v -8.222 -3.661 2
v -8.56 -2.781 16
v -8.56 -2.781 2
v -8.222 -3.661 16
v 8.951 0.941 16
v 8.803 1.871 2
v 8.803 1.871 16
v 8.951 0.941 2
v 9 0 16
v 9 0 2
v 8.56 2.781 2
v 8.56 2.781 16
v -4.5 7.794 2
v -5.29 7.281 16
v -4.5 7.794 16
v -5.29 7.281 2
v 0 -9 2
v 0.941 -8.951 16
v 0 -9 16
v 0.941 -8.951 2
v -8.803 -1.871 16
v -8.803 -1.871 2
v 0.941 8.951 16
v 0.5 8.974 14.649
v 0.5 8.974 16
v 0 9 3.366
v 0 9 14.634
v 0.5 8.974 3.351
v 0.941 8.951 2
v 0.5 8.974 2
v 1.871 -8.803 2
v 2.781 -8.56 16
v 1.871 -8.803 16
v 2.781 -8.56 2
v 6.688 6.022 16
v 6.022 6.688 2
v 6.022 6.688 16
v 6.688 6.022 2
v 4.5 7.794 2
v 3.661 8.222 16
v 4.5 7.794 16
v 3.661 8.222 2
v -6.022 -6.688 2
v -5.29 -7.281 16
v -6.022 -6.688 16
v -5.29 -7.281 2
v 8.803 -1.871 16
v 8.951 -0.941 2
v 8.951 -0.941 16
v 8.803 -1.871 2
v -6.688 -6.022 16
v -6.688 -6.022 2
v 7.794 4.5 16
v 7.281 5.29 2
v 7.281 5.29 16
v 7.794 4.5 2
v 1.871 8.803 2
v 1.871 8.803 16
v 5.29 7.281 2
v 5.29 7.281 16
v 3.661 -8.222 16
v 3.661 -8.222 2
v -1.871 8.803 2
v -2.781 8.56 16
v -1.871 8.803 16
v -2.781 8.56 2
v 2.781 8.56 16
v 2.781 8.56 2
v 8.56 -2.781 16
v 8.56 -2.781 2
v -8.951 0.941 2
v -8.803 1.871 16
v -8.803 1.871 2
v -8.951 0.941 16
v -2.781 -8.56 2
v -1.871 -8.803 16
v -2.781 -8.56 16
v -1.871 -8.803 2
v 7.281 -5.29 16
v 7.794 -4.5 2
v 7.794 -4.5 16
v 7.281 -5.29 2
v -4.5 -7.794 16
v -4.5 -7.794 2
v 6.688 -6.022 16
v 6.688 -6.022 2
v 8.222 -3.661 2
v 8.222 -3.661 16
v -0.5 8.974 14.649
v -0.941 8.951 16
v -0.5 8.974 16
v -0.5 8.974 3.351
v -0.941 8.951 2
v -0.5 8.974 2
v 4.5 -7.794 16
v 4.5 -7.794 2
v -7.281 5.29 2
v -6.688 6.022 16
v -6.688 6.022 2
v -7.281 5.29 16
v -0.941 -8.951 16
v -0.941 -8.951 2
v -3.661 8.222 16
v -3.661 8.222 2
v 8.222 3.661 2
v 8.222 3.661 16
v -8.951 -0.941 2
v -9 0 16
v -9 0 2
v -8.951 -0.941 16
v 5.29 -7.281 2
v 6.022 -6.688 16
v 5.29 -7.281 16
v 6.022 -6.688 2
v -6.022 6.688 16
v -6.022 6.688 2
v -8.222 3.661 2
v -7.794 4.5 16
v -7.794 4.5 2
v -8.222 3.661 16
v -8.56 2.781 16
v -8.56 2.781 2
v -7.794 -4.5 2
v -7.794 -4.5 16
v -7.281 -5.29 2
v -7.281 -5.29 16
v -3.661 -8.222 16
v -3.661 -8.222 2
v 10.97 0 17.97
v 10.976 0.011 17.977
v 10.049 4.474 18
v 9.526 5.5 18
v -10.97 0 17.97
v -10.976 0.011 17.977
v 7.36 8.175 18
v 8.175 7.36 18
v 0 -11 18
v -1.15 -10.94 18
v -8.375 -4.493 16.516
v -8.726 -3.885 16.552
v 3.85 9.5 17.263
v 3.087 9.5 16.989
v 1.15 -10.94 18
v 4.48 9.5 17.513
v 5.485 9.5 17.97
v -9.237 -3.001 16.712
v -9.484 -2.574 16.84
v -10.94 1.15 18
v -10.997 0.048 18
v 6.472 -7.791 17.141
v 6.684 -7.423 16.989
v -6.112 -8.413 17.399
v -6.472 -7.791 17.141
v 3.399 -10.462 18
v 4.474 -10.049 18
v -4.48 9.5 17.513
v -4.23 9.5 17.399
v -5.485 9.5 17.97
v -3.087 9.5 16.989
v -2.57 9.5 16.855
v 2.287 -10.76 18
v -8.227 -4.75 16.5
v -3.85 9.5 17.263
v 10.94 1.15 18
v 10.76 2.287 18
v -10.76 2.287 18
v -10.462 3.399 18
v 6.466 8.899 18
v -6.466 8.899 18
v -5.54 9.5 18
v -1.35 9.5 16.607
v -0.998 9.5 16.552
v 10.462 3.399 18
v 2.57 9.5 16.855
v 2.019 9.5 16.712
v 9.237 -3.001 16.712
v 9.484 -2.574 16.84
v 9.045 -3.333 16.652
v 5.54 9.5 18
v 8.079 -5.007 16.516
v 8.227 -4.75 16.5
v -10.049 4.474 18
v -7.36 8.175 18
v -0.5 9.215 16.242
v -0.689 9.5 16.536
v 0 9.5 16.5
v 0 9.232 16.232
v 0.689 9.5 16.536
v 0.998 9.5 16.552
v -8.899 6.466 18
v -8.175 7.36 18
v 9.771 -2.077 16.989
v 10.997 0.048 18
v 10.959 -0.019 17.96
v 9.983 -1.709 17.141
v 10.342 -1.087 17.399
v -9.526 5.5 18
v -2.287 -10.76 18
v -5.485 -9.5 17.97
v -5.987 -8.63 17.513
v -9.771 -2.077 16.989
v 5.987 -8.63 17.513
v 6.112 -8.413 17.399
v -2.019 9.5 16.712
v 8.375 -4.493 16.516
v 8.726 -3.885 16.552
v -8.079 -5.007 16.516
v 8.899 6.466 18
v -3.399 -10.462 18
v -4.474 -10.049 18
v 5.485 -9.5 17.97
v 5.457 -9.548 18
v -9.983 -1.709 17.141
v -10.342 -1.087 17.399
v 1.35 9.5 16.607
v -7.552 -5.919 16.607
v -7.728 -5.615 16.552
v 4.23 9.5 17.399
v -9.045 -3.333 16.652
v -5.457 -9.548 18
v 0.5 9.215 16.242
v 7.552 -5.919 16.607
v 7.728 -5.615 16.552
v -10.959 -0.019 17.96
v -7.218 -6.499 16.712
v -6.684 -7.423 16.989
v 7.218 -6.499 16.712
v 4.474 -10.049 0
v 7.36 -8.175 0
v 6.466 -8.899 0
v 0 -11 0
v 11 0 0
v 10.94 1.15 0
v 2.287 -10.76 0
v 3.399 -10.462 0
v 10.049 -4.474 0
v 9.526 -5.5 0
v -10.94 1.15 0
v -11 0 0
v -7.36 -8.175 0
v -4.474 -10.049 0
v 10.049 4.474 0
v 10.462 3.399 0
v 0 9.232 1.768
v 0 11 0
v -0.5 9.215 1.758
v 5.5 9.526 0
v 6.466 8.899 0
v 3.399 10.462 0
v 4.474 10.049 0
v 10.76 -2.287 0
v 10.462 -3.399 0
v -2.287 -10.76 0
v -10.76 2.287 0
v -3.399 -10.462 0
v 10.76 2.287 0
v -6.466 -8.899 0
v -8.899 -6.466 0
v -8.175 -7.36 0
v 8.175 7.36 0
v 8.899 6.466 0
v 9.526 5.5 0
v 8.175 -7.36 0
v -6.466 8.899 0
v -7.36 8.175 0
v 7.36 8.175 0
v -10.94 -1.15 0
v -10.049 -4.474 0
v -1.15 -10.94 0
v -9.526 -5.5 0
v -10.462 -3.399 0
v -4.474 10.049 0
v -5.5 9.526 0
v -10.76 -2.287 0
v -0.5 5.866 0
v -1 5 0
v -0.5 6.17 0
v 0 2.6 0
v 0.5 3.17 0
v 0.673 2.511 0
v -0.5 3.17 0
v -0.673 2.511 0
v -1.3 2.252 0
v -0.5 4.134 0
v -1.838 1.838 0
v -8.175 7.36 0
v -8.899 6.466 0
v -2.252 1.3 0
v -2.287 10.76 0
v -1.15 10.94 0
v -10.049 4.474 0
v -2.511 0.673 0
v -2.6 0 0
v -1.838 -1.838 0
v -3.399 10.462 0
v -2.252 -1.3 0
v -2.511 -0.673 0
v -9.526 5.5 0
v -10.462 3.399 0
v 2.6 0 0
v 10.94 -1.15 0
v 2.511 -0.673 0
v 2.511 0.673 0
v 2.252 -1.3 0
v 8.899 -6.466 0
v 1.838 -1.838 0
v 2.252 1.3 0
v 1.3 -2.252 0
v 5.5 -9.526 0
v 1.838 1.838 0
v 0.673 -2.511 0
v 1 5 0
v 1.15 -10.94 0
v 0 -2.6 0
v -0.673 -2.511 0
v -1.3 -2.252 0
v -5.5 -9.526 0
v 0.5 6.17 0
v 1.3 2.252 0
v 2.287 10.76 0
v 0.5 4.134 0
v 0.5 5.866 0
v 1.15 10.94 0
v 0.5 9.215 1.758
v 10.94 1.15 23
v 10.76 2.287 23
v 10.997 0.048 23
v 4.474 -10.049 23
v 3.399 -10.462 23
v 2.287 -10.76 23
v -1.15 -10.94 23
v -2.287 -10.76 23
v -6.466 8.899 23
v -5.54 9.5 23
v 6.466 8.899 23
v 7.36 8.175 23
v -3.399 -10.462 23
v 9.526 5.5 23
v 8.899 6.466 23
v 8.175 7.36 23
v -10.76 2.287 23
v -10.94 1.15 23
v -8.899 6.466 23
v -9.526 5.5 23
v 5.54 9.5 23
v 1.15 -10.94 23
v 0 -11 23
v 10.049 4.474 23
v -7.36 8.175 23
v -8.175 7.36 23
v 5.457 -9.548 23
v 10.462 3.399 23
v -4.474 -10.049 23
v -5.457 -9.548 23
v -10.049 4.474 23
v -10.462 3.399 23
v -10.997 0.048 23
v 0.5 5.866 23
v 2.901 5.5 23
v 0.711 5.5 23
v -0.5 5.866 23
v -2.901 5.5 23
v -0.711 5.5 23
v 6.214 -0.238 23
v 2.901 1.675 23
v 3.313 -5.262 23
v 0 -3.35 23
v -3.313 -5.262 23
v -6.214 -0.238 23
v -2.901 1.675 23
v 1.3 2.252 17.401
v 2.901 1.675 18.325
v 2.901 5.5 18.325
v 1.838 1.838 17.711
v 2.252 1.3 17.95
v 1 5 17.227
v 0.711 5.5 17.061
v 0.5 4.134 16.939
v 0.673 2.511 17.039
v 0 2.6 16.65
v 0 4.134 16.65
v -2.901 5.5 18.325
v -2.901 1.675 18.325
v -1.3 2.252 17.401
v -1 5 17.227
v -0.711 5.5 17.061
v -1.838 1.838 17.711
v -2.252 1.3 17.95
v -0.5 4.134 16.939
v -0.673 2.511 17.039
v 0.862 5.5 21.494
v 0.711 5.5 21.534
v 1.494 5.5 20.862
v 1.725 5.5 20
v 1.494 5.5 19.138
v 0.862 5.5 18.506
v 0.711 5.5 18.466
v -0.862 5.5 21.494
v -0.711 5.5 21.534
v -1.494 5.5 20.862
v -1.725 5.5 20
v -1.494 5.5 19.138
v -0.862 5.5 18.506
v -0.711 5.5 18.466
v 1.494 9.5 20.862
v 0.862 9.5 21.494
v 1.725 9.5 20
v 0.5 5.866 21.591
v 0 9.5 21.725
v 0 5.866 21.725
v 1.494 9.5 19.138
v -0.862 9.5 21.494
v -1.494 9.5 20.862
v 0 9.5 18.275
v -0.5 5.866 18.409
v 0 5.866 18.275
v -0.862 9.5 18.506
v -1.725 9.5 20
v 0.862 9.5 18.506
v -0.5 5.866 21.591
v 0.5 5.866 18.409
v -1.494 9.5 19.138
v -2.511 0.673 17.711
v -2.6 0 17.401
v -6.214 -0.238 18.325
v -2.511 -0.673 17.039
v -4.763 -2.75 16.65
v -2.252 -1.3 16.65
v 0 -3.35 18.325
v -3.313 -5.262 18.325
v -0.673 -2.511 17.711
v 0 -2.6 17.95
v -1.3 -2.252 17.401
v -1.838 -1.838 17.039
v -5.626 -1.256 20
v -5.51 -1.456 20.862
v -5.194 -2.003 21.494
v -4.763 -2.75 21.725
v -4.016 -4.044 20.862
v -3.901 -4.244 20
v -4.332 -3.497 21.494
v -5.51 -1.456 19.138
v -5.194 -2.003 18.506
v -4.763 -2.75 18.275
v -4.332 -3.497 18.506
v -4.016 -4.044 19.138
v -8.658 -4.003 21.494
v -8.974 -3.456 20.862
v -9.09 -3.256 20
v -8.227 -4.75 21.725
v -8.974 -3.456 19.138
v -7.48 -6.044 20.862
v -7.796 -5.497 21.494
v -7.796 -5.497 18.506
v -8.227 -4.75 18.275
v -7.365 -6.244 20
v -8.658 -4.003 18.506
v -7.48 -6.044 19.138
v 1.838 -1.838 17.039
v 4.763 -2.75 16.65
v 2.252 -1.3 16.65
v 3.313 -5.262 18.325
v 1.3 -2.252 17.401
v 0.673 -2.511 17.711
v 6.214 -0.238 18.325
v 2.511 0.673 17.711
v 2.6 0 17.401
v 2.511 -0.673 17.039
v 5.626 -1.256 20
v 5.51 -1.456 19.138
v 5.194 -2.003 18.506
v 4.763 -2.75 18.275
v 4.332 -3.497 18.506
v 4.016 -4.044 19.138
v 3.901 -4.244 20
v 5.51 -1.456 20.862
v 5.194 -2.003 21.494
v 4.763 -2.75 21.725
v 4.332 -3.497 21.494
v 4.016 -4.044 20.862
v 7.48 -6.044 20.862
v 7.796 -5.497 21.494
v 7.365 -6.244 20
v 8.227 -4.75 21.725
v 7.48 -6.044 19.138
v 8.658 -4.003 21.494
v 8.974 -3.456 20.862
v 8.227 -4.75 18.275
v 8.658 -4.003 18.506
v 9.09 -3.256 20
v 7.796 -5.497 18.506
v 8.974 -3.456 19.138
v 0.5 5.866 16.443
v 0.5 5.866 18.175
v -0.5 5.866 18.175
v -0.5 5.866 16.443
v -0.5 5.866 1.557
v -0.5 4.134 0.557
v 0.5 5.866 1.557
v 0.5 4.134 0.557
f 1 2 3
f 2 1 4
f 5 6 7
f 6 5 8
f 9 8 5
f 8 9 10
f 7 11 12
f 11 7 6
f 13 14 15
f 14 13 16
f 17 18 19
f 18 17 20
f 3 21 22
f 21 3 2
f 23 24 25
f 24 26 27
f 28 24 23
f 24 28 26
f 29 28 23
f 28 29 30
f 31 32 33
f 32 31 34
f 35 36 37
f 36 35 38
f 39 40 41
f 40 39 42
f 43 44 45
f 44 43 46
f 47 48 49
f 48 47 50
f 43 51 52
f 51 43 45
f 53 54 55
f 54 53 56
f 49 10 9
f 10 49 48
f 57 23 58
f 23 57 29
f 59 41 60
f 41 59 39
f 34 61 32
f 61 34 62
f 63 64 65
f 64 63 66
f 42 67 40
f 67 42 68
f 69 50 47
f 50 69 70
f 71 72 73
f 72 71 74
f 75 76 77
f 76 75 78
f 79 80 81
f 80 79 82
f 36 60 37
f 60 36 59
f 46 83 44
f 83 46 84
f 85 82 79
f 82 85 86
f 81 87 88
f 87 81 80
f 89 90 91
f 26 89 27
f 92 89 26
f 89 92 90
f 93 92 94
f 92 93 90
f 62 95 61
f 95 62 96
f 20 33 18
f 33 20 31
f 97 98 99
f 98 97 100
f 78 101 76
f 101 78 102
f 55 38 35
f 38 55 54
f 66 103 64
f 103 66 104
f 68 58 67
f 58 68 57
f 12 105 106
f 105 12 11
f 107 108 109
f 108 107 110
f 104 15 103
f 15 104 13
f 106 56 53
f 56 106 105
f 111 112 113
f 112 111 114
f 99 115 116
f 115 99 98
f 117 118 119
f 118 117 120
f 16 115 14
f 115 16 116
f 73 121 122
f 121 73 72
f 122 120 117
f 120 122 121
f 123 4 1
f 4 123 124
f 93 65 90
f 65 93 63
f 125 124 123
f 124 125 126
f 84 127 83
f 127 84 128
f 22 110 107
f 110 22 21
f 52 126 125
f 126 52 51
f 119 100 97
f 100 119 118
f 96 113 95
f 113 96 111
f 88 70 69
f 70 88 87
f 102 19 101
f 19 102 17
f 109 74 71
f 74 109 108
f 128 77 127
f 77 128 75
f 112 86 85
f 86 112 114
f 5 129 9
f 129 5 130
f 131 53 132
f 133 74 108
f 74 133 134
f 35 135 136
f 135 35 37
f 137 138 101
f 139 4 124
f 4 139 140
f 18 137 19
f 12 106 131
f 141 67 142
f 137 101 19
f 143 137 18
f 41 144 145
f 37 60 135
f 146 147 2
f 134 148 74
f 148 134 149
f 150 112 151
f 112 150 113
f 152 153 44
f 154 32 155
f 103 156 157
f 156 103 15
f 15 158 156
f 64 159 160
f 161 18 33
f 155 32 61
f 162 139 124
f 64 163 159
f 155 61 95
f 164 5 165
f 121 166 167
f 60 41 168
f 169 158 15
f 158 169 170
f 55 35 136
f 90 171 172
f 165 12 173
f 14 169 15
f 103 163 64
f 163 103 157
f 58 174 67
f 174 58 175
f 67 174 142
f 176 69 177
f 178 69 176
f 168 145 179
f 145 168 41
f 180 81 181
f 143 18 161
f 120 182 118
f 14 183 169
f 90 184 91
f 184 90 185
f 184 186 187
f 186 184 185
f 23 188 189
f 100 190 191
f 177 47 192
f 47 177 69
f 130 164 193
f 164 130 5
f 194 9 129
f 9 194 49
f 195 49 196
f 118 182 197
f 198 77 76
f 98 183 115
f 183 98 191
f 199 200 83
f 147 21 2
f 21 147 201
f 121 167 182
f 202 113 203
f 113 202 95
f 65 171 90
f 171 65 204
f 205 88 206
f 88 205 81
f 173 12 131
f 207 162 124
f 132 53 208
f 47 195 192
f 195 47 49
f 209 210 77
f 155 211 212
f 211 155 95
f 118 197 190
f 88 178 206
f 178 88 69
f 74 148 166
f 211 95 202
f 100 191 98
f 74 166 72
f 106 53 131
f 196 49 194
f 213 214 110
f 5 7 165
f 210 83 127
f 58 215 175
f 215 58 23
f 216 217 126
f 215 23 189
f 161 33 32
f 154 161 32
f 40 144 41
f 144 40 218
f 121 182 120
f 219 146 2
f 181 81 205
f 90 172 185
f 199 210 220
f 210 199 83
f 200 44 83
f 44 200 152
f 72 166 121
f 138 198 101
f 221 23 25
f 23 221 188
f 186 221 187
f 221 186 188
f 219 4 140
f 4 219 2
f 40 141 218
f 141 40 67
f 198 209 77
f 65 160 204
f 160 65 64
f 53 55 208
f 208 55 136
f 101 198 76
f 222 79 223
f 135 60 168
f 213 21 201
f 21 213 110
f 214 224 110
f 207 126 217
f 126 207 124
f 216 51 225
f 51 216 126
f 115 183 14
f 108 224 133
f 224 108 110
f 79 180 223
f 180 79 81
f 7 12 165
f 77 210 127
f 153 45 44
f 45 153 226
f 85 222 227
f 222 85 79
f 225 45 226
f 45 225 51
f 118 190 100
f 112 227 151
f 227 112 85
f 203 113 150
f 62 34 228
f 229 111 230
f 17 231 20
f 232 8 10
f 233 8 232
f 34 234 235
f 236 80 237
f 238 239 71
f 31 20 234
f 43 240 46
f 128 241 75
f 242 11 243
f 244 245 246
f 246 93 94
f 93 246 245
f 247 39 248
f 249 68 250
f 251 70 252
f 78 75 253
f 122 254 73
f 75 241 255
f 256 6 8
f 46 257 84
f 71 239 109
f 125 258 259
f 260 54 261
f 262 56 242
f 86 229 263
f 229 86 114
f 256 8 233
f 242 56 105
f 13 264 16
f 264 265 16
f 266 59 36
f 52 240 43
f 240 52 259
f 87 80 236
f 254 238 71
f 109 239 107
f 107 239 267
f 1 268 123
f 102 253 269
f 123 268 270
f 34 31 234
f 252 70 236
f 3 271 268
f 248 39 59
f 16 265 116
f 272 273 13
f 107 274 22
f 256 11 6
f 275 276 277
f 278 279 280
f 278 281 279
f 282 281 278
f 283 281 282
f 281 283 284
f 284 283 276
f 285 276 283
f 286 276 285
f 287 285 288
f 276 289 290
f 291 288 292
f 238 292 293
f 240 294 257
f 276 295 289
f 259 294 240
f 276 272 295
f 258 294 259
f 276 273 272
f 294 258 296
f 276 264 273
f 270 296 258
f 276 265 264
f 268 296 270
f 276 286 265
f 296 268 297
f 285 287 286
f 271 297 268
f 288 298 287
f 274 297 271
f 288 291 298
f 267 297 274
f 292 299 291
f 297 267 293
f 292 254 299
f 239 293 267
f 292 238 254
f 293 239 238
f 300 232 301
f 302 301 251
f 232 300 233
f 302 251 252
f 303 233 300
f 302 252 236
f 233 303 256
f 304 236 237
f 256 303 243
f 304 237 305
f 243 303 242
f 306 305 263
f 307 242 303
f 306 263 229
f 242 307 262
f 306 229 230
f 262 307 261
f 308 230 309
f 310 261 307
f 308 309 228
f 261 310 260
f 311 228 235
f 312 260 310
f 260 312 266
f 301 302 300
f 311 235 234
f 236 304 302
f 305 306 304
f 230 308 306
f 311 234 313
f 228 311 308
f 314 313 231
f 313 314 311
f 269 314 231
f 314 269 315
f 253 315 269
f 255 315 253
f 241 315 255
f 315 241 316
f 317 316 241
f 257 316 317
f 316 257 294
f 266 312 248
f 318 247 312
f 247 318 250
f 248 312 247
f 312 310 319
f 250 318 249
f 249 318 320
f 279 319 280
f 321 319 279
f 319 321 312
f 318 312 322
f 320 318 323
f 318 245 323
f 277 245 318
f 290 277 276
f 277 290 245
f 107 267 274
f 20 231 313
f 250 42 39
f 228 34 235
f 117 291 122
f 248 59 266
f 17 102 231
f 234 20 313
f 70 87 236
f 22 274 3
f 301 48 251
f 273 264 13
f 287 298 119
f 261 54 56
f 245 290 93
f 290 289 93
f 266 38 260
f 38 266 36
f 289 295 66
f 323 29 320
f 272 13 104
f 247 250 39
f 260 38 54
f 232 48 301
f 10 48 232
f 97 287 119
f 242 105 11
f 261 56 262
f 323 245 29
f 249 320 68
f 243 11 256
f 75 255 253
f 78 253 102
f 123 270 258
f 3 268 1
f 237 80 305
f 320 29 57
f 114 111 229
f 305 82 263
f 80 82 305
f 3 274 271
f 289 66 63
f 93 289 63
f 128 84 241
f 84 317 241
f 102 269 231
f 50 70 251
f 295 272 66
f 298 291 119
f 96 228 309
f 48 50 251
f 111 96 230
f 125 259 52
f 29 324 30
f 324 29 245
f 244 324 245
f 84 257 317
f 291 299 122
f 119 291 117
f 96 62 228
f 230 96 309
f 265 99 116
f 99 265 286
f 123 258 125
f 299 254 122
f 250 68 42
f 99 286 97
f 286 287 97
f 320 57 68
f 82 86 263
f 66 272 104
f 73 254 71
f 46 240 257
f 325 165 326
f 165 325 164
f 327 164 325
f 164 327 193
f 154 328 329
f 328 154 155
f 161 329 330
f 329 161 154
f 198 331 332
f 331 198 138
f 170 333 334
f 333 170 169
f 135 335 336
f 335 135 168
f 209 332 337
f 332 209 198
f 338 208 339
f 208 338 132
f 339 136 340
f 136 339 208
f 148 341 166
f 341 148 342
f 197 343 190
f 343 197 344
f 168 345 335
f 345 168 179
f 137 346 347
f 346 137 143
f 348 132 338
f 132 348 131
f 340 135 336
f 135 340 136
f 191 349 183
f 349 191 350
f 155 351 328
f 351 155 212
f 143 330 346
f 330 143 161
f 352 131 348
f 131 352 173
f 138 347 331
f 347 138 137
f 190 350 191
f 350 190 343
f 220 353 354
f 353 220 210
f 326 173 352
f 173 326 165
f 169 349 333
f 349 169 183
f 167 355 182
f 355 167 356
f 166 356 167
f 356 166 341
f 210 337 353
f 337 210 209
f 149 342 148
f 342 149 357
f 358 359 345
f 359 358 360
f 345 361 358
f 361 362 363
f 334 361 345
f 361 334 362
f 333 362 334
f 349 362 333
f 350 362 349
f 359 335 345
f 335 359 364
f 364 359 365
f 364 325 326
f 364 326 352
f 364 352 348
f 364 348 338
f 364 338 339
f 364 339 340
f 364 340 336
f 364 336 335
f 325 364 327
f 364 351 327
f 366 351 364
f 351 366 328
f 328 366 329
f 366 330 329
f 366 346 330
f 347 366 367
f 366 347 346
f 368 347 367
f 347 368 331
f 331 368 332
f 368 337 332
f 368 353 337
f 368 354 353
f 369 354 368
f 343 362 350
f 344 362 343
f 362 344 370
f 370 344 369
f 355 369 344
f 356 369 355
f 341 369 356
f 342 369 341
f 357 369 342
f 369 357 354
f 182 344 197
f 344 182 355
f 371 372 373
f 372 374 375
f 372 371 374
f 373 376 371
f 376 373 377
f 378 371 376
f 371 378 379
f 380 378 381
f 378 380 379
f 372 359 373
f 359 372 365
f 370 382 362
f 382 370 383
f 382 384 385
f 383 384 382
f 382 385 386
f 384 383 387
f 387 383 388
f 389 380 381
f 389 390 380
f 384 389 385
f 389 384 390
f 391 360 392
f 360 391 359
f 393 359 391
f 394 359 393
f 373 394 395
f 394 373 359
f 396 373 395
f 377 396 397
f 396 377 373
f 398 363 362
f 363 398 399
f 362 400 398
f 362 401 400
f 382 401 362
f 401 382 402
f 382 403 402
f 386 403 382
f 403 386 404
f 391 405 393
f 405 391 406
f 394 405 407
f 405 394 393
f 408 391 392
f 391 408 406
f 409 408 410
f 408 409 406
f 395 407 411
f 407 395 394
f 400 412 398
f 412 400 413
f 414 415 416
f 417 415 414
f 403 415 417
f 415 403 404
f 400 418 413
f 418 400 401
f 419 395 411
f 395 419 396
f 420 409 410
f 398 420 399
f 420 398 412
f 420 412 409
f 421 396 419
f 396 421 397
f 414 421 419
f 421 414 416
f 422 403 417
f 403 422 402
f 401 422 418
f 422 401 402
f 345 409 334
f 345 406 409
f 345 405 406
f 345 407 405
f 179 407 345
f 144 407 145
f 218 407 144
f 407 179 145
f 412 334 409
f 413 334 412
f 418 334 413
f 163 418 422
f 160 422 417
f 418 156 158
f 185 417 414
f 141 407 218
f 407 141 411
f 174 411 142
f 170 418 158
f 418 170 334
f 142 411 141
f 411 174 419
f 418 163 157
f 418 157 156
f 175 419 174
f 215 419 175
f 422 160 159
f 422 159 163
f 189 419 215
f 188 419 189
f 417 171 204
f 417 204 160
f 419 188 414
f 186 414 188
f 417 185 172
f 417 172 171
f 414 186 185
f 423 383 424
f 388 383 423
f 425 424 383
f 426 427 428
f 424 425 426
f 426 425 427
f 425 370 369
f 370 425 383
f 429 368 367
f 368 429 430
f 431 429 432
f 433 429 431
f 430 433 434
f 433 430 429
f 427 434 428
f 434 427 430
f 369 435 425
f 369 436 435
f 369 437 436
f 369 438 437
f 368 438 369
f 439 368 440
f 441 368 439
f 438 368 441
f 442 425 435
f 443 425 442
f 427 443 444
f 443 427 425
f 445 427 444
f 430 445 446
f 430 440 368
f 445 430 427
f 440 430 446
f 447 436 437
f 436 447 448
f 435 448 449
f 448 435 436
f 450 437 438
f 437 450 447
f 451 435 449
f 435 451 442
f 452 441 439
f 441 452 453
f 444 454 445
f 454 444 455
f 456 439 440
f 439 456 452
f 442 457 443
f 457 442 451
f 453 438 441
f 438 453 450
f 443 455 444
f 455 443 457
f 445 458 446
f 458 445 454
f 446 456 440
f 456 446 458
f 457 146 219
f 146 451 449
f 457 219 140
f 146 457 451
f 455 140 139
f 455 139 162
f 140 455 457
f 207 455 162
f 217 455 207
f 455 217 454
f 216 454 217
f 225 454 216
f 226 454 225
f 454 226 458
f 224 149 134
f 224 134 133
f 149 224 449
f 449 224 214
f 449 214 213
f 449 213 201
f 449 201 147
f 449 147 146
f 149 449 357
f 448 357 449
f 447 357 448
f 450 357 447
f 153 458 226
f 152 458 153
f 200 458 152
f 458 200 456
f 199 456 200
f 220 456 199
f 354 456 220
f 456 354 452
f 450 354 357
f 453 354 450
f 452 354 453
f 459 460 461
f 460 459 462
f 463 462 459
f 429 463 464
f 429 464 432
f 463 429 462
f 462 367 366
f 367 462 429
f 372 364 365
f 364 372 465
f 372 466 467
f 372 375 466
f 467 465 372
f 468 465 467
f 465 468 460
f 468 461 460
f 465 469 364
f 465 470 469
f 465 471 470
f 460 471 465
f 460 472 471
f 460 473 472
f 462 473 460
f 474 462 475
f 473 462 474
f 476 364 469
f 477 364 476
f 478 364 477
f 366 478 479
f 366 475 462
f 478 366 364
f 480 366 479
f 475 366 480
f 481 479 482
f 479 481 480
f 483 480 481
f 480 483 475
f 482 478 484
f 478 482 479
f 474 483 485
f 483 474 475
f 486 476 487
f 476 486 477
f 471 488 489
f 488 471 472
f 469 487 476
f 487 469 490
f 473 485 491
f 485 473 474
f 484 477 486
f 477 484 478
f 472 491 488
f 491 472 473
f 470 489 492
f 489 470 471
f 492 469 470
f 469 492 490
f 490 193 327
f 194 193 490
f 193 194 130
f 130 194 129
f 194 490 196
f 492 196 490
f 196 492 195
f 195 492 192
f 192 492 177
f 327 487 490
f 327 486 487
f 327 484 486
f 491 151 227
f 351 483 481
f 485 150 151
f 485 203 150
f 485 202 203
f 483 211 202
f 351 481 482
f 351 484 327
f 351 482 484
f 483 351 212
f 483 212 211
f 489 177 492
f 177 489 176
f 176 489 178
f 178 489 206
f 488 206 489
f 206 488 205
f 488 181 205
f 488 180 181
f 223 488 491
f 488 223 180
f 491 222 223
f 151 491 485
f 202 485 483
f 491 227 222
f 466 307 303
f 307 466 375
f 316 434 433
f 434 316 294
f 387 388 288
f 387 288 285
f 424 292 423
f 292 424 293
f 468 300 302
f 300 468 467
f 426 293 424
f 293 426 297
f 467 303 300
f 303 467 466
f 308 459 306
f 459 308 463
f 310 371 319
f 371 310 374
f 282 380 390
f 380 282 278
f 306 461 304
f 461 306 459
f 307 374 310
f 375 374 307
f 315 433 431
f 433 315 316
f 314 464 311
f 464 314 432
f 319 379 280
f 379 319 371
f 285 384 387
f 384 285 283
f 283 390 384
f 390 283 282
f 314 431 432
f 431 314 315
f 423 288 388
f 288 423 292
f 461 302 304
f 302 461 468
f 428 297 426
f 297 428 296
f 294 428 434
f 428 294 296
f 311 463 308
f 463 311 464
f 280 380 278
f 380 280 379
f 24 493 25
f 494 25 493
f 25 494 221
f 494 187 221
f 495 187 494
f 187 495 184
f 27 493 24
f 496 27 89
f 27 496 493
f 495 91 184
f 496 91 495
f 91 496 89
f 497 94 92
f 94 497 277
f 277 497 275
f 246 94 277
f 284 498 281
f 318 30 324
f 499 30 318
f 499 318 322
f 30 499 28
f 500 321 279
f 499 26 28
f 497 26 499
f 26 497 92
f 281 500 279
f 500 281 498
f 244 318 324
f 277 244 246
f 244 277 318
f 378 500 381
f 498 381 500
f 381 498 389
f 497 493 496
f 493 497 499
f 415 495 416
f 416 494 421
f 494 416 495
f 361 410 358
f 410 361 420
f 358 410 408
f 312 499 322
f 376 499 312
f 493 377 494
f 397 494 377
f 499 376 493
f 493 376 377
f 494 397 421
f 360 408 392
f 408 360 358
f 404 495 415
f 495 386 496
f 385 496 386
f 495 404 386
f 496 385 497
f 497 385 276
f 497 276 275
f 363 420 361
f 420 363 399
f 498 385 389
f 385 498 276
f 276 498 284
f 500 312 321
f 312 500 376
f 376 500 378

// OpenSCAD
// file: ../include/configuration.scad
// Increase this if your slicer or printer make holes too tight.
extra_radius = 0.1;

// OD = outside diameter, corner to corner.
m3_nut_od = 6.1;
m3_nut_radius = m3_nut_od/2 + 0.2 + extra_radius;
m3_washer_radius = 3.5 + extra_radius;

// Major diameter of metric 3mm thread.
m3_major = 2.85;
m3_radius = m3_major/2 + extra_radius;
m3_wide_radius = m3_major/2 + extra_radius + 0.2;

// NEMA17 stepper motors.
motor_shaft_diameter = 5;
motor_shaft_radius = motor_shaft_diameter/2 + extra_radius;

// Frame brackets. M3x8mm screws work best with 3.6 mm brackets.
thickness = 3.6;

// OpenBeam or Misumi. Currently only 15x15 mm, but there is a plan
// to make models more parametric and allow 20x20 mm in the future.
extrusion = 15;

// Placement for the NEMA17 stepper motors.
motor_offset = 44;
motor_length = 47;
// main file
include <../include/configuration.scad>;

radius = 9;
width = 16;
top = 5;
smoothness = 60;

module spool() {
  difference() {
    union() {
      cylinder(r=radius, h=width, center=true, $fn=smoothness);
      translate([0, 0, width/2])
	cylinder(r1=radius, r2=radius+2, h=2, center=true, $fn=smoothness);
      translate([0, 0, -width/2])
	cylinder(r2=radius, r1=radius+2, h=2, center=true, $fn=smoothness);
      translate([0, 0, width/2+top/2+1])
	cylinder(r=radius+2, h=top, center=true, $fn=smoothness);
    }
    // Motor shaft.
    cylinder(r=motor_shaft_radius, h=50, center=true, $fn=24);
    // Filament tunnels.
    translate([0, radius, width/2-1.5]) rotate([-30, 0, 0])
      #cube([1, 2*radius, 1.5], center=true);
    translate([0, radius, -width/2+1.5]) rotate([30, 0, 0])
      #cube([1, 2*radius, 1.5], center=true);
    translate([0, 5, 0])
      #cylinder(r=1, h=40, center=true, $fn=6);
    // M3 screws and nuts on three sides.
    for (a = [0:120:359]) {
      rotate([0, 0, a]) translate([0, 4.5, width/2+3]) rotate([90, 0, 0]) {
	cylinder(r=m3_wide_radius, h=radius+5, center=true, $fn=12);
	translate([0, 0, 1-radius]) cylinder(r=10, h=6, center=true);
	for (z = [0:10]) {
	  translate([0, z, 1.5]) rotate([0, 0, 30])
	    cylinder(r=m3_nut_radius, h=5, center=true, $fn=6);
	}
      }
    }
  }
}

translate([0, 0, width/2+1]) spool();
